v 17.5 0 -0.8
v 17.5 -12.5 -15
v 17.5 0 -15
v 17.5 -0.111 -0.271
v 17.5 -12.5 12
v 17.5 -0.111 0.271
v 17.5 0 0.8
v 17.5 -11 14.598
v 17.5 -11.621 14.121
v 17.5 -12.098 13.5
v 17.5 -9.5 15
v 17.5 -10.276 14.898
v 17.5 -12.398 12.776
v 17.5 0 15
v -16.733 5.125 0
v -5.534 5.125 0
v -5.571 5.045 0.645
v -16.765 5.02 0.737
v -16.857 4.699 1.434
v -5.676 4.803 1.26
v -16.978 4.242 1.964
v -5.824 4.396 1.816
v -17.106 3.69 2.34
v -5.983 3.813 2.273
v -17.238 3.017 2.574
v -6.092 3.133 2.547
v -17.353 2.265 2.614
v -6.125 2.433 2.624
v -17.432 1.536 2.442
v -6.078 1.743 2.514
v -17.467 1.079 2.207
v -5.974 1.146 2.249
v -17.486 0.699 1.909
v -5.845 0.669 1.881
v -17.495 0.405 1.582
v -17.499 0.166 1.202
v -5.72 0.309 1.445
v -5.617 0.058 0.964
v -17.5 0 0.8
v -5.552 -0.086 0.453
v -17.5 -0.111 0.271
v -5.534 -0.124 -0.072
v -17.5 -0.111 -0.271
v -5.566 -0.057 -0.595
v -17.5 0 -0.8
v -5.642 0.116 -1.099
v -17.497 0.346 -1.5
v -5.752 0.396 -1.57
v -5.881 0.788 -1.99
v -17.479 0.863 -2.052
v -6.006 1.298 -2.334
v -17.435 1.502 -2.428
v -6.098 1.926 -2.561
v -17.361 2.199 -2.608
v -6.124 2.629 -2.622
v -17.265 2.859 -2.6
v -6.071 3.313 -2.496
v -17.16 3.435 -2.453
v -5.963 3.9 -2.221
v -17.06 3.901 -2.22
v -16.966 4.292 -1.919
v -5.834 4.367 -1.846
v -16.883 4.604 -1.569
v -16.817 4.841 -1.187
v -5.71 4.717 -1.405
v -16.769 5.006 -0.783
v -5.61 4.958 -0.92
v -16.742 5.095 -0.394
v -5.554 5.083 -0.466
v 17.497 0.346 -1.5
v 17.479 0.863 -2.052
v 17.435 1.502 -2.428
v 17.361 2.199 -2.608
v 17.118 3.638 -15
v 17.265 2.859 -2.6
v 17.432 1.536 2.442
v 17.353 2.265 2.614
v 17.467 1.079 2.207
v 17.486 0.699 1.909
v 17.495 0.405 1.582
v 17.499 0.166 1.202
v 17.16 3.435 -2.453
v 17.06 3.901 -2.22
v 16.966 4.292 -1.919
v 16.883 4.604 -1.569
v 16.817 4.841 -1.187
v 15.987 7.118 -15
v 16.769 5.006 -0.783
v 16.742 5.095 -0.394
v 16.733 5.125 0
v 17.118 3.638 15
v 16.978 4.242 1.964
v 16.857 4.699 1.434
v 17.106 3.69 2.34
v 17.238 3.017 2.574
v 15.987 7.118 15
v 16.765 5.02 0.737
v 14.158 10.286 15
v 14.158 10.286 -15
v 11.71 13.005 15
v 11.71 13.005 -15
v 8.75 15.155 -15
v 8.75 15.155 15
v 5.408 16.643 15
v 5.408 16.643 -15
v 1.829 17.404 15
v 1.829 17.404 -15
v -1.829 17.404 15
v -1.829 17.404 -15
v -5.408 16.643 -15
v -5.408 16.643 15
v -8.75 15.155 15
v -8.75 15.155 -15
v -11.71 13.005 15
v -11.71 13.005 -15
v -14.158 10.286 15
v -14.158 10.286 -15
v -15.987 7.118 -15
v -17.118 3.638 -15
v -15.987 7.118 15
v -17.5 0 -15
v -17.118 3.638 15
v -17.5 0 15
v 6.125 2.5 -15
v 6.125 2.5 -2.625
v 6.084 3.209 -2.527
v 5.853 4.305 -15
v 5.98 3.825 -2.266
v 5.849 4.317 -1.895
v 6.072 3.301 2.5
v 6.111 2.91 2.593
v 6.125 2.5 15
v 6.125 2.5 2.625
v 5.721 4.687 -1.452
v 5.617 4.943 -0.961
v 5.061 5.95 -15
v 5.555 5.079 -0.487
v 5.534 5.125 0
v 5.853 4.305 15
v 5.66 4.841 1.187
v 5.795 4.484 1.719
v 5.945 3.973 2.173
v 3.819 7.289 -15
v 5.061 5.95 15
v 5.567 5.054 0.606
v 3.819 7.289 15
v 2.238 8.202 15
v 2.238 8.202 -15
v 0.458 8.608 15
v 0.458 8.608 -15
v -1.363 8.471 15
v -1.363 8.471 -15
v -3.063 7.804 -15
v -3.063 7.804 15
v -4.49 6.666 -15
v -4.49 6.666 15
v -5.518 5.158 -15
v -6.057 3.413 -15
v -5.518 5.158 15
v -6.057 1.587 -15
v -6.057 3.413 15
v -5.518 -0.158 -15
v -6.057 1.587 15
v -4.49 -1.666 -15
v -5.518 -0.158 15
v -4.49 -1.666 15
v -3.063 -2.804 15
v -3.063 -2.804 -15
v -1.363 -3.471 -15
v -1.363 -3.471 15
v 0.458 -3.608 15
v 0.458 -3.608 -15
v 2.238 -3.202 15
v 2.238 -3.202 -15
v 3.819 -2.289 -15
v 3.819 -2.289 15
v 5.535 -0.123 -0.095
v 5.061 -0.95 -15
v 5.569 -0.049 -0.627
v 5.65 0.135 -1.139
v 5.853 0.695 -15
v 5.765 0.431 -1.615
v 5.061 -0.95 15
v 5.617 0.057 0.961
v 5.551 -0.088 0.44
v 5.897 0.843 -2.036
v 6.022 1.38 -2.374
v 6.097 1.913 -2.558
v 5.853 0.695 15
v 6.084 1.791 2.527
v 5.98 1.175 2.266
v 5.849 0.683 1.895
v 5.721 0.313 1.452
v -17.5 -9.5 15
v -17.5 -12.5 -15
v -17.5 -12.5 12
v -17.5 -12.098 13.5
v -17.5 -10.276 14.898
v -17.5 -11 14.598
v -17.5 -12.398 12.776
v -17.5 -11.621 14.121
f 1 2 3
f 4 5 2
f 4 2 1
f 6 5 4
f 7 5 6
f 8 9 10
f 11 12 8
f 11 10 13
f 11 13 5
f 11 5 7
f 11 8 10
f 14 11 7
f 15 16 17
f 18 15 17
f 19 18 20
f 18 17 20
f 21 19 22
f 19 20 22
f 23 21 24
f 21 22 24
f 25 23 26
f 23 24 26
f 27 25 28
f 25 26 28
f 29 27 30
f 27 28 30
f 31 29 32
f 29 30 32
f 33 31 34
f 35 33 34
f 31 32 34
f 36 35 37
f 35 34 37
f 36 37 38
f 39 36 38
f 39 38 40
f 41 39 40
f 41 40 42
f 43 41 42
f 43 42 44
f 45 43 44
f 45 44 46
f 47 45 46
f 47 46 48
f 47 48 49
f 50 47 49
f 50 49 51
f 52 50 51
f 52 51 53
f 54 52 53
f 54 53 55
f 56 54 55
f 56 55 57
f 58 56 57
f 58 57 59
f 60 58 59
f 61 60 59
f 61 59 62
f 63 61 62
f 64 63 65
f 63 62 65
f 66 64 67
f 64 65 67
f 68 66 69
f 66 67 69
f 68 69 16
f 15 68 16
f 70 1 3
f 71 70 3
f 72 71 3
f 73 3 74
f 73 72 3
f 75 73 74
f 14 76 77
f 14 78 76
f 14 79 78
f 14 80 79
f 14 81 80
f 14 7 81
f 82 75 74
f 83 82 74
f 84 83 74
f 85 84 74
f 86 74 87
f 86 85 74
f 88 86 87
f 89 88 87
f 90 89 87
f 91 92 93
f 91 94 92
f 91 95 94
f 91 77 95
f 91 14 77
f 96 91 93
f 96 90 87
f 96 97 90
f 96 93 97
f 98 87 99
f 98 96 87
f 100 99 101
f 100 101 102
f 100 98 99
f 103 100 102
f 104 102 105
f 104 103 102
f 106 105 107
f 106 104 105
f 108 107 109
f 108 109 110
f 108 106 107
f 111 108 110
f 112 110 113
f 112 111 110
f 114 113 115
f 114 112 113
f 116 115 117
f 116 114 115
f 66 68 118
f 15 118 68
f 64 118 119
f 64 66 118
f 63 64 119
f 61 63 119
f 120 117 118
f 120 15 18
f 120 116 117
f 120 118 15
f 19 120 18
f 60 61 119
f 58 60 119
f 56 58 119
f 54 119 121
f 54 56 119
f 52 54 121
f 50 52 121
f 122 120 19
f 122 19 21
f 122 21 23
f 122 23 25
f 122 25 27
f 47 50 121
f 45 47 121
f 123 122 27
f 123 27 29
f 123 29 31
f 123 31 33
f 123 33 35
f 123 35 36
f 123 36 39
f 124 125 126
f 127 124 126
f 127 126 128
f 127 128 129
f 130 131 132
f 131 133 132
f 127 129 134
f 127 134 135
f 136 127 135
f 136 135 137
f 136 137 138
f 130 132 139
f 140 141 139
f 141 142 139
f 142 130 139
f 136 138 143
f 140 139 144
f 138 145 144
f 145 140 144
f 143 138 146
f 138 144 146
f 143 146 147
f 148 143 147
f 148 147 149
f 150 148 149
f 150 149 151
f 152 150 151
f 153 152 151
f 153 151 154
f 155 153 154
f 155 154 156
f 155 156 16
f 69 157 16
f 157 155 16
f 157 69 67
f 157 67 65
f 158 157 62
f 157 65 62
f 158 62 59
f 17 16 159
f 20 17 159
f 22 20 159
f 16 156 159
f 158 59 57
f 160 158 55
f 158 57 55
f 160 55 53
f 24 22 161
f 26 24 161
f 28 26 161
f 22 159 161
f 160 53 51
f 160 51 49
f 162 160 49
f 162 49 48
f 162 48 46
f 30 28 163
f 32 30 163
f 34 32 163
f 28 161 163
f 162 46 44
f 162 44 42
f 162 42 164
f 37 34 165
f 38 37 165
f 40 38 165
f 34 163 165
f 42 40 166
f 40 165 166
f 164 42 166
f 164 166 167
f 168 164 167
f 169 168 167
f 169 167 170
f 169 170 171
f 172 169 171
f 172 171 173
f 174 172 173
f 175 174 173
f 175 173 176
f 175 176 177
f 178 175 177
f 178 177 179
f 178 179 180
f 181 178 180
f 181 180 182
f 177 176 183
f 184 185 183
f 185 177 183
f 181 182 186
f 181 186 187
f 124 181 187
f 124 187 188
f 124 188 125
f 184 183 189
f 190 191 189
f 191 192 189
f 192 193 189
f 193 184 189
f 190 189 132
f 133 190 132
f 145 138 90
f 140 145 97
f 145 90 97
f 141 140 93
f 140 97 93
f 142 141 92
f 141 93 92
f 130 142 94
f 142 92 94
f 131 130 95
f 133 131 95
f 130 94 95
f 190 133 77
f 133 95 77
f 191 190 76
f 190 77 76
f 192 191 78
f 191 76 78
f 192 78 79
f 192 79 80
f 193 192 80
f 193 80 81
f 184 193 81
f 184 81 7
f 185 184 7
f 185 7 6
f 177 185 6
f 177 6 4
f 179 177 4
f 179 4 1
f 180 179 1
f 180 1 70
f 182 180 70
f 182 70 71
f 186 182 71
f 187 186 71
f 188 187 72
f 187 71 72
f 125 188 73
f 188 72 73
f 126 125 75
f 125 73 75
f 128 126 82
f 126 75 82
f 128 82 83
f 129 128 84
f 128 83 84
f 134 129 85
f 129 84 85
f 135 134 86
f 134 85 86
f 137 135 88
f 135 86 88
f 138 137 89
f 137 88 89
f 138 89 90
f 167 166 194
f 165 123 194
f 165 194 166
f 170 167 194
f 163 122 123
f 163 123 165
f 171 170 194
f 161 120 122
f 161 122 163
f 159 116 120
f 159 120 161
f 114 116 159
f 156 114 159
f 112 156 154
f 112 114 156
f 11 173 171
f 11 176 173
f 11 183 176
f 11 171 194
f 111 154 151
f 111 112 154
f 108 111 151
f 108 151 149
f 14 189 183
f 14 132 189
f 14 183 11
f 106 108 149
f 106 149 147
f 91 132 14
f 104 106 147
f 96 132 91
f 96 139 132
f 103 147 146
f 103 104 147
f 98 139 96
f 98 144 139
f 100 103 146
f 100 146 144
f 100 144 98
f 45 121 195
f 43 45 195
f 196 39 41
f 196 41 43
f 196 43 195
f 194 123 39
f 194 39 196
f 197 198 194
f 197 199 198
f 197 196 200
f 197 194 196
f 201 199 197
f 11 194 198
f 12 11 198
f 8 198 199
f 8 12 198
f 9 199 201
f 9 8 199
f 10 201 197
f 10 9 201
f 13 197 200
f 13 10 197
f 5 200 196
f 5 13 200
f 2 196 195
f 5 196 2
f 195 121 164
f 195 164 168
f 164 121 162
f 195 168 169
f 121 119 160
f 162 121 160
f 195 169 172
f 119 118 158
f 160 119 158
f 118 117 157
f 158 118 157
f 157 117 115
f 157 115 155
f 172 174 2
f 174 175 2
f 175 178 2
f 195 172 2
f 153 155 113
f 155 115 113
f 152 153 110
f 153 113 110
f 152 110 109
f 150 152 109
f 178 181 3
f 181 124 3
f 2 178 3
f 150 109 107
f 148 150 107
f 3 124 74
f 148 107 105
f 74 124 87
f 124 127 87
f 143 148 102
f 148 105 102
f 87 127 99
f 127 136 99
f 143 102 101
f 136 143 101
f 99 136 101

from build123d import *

# Parameters (mm, degrees)
PAD_DEPTH     = 15
FILLET_R      = 3
SKETCH001_R   = 6.125
HOLE_DEPTH    = 30.001
SKETCH002_R   = 2.625
HOLE001_DEPTH = 35.001


with BuildPart() as part:
    # Sketch → Pad (new body, symmetric)
    with BuildSketch(Plane.XY):
        with BuildLine():
            Line((-17.5, 0), (-17.5, -12.5))
            Line((-17.5, -12.5), (17.5, -12.5))
            Line((17.5, -12.5), (17.5, 0))
            ThreePointArc((17.5, 0), (0, 17.5), (-17.5, 0))
        make_face()
    extrude(amount=PAD_DEPTH, both=True)

    # Fillet
    fillet_edges = [part.edges().sort_by_distance(p)[0] for p in [
        (0, -12.5, 15),
    ]]
    fillet(fillet_edges, radius=FILLET_R)

    # Sketch001 (on Face5 of Fillet) → Hole (cut, through all)
    with BuildSketch(Plane.XY.offset(15)):
        with Locations((0, 2.5)):
            Circle(SKETCH001_R)
    extrude(amount=-HOLE_DEPTH, mode=Mode.SUBTRACT)

    # Sketch002 (on Face7 of Hole) → Hole001 (cut, through all)
    with BuildSketch(Plane.YZ.offset(17.5)):
        with Locations((2.5, 0)):
            Circle(SKETCH002_R)
    extrude(amount=-HOLE001_DEPTH, mode=Mode.SUBTRACT)


solid = part.part
